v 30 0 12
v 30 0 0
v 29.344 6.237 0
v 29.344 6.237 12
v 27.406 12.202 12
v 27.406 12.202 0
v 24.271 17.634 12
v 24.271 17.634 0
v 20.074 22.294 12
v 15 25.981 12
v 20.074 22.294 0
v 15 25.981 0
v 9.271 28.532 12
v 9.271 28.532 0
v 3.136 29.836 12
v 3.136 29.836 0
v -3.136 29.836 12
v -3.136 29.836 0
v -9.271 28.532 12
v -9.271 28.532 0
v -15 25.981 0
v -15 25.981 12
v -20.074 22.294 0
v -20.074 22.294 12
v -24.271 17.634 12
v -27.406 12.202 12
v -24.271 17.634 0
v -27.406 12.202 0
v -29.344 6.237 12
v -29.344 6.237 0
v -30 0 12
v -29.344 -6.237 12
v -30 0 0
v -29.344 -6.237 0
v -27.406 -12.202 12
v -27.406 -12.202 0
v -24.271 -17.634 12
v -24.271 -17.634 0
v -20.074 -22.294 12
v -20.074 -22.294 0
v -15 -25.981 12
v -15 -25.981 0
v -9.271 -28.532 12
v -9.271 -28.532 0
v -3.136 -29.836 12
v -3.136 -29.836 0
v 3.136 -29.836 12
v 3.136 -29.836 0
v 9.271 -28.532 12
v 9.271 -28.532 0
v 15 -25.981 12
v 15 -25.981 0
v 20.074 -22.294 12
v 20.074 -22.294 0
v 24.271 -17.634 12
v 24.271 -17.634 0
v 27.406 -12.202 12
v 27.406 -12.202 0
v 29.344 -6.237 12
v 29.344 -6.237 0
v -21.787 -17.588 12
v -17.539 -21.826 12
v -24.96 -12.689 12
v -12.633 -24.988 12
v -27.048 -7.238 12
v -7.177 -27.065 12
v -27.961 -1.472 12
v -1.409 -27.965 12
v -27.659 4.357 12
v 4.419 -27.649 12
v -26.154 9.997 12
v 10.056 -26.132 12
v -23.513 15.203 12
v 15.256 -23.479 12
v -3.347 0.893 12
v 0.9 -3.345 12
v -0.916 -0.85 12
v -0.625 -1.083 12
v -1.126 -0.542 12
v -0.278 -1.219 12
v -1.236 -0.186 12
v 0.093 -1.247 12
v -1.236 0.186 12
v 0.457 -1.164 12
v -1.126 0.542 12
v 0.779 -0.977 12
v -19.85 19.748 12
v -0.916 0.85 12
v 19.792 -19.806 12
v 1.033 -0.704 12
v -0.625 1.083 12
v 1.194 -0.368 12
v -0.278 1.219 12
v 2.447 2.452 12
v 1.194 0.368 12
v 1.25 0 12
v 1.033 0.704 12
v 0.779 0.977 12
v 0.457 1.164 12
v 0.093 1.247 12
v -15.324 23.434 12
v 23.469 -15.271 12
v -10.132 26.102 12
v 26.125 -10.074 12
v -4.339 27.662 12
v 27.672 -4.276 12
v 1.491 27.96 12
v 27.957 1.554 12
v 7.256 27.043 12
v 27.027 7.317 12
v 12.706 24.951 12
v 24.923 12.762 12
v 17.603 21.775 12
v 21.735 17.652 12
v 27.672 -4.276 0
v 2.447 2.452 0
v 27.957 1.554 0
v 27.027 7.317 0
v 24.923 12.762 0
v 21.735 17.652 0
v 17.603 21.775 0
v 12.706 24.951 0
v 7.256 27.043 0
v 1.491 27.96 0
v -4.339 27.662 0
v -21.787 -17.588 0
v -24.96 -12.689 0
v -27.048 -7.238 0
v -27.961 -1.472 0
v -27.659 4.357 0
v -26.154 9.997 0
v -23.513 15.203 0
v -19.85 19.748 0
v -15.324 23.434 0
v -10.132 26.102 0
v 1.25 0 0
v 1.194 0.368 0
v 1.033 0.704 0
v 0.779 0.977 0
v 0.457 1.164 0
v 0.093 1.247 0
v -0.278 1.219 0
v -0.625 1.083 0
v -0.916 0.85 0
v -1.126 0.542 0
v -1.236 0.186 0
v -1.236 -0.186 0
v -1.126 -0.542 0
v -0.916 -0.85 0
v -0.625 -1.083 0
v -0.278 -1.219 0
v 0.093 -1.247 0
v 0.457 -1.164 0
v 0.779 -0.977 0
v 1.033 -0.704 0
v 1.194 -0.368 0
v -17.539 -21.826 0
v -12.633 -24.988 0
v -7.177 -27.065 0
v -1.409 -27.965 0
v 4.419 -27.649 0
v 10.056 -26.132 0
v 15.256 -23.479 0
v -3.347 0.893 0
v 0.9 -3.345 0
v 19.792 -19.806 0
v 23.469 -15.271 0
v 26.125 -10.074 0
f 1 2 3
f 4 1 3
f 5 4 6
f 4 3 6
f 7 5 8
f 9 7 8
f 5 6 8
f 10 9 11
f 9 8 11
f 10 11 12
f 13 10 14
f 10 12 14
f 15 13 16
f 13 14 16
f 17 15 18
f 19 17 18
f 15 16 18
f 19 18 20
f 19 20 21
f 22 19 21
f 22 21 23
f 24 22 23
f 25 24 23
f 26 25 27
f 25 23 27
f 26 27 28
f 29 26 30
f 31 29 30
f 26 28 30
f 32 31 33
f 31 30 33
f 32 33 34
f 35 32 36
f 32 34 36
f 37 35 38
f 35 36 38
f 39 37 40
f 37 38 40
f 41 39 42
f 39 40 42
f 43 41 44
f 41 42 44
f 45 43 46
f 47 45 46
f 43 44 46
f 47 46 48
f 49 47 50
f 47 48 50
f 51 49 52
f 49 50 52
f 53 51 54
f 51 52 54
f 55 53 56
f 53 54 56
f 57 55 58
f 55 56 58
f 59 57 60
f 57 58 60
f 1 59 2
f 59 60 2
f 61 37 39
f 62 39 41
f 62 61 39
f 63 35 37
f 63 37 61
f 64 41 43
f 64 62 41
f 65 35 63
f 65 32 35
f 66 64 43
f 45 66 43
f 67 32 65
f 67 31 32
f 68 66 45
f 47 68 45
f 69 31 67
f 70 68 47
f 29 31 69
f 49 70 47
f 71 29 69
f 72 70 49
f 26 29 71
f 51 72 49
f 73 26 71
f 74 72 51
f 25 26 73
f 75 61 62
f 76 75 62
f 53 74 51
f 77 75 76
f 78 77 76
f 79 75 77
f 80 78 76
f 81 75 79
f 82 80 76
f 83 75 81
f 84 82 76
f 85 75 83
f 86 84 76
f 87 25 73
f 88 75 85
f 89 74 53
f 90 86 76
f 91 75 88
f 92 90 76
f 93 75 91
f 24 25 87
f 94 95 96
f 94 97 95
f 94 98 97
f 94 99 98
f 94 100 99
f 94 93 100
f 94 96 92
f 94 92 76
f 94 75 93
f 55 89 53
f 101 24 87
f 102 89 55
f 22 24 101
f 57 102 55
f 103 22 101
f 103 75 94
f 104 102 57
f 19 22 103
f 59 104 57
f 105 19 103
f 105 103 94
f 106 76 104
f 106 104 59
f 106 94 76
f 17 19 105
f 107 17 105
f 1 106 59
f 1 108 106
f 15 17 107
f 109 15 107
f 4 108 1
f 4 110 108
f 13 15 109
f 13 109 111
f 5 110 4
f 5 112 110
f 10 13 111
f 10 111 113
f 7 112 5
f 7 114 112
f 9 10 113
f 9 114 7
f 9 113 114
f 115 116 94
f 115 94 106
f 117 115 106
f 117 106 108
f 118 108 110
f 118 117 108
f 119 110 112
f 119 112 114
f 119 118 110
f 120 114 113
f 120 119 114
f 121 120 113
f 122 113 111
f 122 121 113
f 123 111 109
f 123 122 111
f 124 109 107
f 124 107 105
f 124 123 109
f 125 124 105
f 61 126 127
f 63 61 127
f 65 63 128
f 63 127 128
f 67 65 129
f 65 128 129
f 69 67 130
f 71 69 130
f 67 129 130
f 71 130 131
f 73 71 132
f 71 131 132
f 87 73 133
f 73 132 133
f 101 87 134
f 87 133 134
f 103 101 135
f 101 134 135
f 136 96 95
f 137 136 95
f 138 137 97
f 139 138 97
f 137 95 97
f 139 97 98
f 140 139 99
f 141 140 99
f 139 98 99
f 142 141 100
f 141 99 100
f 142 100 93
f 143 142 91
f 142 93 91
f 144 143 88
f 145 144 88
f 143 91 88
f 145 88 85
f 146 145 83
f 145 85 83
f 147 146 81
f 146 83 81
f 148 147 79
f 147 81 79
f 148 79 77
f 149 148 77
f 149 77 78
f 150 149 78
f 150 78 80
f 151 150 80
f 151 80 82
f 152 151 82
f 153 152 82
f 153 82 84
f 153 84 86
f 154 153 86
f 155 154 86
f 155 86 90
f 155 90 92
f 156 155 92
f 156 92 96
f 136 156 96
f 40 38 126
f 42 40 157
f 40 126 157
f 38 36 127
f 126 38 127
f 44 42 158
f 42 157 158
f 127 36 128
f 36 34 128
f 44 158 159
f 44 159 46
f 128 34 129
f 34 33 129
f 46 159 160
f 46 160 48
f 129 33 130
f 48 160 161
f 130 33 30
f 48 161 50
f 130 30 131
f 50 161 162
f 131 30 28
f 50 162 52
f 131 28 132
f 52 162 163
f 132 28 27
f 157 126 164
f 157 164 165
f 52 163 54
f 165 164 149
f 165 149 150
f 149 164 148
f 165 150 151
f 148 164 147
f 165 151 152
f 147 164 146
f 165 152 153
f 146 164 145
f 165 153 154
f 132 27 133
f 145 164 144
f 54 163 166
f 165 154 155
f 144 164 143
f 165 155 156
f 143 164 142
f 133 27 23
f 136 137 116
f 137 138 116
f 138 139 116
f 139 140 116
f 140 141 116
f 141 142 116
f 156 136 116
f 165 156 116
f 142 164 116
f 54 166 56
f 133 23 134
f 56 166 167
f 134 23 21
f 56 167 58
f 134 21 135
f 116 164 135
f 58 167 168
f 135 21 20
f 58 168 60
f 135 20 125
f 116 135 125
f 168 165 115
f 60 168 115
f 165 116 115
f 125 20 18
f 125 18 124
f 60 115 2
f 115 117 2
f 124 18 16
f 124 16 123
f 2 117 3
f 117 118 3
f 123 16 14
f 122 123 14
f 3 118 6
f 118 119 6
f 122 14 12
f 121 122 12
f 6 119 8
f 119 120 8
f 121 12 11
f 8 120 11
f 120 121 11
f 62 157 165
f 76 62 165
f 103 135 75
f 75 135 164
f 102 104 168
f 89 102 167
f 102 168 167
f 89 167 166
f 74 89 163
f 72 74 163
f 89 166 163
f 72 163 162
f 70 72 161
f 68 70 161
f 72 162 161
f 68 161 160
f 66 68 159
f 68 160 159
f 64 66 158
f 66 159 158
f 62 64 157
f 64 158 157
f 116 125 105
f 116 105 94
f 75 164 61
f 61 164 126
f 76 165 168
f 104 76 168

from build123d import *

# Parameters (mm, degrees)
SKETCH2_R           = 30
BOSS_EXTRUDE1_DEPTH = 12
SKETCH4_R           = 1.25
CUT_EXTRUDE1_DEPTH  = 45.09081537


with BuildPart() as part:
    # Sketch2 → Boss-Extrude1 (new body)
    with BuildSketch(Plane.XY):
        Circle(SKETCH2_R)
        with BuildLine():
            Line((-10.13235825, 26.102400585), (-3.347071467, 0.892811622))
            Line((-3.347071467, 0.892811622), (-21.786572537, -17.588213585))
            ThreePointArc((-21.786572537, -17.588213585), (-27.054056577, 7.216510426), (-10.13235825, 26.102400585))
        make_face(mode=Mode.SUBTRACT)
        with BuildLine():
            Line((-17.539162882, -21.826079937), (0.900338188, -3.34505473))
            Line((0.900338188, -3.34505473), (26.12512604, -10.073618486))
            ThreePointArc((26.12512604, -10.073618486), (7.277346933, -27.037755484), (-17.539162882, -21.826079937))
        make_face(mode=Mode.SUBTRACT)
        with BuildLine():
            Line((-4.338553503, 27.661832071), (2.446733279, 2.452243108))
            Line((2.446733279, 2.452243108), (27.671521131, -4.276320648))
            ThreePointArc((27.671521131, -4.276320648), (19.776709644, 19.821245058), (-4.338553503, 27.661832071))
        make_face(mode=Mode.SUBTRACT)
    extrude(amount=BOSS_EXTRUDE1_DEPTH)

    # Sketch4 → Cut-Extrude1 (cut, through all)
    with BuildSketch(Plane.XY.offset(12)):
        Circle(SKETCH4_R)
    extrude(amount=-CUT_EXTRUDE1_DEPTH, mode=Mode.SUBTRACT)


solid = part.part
